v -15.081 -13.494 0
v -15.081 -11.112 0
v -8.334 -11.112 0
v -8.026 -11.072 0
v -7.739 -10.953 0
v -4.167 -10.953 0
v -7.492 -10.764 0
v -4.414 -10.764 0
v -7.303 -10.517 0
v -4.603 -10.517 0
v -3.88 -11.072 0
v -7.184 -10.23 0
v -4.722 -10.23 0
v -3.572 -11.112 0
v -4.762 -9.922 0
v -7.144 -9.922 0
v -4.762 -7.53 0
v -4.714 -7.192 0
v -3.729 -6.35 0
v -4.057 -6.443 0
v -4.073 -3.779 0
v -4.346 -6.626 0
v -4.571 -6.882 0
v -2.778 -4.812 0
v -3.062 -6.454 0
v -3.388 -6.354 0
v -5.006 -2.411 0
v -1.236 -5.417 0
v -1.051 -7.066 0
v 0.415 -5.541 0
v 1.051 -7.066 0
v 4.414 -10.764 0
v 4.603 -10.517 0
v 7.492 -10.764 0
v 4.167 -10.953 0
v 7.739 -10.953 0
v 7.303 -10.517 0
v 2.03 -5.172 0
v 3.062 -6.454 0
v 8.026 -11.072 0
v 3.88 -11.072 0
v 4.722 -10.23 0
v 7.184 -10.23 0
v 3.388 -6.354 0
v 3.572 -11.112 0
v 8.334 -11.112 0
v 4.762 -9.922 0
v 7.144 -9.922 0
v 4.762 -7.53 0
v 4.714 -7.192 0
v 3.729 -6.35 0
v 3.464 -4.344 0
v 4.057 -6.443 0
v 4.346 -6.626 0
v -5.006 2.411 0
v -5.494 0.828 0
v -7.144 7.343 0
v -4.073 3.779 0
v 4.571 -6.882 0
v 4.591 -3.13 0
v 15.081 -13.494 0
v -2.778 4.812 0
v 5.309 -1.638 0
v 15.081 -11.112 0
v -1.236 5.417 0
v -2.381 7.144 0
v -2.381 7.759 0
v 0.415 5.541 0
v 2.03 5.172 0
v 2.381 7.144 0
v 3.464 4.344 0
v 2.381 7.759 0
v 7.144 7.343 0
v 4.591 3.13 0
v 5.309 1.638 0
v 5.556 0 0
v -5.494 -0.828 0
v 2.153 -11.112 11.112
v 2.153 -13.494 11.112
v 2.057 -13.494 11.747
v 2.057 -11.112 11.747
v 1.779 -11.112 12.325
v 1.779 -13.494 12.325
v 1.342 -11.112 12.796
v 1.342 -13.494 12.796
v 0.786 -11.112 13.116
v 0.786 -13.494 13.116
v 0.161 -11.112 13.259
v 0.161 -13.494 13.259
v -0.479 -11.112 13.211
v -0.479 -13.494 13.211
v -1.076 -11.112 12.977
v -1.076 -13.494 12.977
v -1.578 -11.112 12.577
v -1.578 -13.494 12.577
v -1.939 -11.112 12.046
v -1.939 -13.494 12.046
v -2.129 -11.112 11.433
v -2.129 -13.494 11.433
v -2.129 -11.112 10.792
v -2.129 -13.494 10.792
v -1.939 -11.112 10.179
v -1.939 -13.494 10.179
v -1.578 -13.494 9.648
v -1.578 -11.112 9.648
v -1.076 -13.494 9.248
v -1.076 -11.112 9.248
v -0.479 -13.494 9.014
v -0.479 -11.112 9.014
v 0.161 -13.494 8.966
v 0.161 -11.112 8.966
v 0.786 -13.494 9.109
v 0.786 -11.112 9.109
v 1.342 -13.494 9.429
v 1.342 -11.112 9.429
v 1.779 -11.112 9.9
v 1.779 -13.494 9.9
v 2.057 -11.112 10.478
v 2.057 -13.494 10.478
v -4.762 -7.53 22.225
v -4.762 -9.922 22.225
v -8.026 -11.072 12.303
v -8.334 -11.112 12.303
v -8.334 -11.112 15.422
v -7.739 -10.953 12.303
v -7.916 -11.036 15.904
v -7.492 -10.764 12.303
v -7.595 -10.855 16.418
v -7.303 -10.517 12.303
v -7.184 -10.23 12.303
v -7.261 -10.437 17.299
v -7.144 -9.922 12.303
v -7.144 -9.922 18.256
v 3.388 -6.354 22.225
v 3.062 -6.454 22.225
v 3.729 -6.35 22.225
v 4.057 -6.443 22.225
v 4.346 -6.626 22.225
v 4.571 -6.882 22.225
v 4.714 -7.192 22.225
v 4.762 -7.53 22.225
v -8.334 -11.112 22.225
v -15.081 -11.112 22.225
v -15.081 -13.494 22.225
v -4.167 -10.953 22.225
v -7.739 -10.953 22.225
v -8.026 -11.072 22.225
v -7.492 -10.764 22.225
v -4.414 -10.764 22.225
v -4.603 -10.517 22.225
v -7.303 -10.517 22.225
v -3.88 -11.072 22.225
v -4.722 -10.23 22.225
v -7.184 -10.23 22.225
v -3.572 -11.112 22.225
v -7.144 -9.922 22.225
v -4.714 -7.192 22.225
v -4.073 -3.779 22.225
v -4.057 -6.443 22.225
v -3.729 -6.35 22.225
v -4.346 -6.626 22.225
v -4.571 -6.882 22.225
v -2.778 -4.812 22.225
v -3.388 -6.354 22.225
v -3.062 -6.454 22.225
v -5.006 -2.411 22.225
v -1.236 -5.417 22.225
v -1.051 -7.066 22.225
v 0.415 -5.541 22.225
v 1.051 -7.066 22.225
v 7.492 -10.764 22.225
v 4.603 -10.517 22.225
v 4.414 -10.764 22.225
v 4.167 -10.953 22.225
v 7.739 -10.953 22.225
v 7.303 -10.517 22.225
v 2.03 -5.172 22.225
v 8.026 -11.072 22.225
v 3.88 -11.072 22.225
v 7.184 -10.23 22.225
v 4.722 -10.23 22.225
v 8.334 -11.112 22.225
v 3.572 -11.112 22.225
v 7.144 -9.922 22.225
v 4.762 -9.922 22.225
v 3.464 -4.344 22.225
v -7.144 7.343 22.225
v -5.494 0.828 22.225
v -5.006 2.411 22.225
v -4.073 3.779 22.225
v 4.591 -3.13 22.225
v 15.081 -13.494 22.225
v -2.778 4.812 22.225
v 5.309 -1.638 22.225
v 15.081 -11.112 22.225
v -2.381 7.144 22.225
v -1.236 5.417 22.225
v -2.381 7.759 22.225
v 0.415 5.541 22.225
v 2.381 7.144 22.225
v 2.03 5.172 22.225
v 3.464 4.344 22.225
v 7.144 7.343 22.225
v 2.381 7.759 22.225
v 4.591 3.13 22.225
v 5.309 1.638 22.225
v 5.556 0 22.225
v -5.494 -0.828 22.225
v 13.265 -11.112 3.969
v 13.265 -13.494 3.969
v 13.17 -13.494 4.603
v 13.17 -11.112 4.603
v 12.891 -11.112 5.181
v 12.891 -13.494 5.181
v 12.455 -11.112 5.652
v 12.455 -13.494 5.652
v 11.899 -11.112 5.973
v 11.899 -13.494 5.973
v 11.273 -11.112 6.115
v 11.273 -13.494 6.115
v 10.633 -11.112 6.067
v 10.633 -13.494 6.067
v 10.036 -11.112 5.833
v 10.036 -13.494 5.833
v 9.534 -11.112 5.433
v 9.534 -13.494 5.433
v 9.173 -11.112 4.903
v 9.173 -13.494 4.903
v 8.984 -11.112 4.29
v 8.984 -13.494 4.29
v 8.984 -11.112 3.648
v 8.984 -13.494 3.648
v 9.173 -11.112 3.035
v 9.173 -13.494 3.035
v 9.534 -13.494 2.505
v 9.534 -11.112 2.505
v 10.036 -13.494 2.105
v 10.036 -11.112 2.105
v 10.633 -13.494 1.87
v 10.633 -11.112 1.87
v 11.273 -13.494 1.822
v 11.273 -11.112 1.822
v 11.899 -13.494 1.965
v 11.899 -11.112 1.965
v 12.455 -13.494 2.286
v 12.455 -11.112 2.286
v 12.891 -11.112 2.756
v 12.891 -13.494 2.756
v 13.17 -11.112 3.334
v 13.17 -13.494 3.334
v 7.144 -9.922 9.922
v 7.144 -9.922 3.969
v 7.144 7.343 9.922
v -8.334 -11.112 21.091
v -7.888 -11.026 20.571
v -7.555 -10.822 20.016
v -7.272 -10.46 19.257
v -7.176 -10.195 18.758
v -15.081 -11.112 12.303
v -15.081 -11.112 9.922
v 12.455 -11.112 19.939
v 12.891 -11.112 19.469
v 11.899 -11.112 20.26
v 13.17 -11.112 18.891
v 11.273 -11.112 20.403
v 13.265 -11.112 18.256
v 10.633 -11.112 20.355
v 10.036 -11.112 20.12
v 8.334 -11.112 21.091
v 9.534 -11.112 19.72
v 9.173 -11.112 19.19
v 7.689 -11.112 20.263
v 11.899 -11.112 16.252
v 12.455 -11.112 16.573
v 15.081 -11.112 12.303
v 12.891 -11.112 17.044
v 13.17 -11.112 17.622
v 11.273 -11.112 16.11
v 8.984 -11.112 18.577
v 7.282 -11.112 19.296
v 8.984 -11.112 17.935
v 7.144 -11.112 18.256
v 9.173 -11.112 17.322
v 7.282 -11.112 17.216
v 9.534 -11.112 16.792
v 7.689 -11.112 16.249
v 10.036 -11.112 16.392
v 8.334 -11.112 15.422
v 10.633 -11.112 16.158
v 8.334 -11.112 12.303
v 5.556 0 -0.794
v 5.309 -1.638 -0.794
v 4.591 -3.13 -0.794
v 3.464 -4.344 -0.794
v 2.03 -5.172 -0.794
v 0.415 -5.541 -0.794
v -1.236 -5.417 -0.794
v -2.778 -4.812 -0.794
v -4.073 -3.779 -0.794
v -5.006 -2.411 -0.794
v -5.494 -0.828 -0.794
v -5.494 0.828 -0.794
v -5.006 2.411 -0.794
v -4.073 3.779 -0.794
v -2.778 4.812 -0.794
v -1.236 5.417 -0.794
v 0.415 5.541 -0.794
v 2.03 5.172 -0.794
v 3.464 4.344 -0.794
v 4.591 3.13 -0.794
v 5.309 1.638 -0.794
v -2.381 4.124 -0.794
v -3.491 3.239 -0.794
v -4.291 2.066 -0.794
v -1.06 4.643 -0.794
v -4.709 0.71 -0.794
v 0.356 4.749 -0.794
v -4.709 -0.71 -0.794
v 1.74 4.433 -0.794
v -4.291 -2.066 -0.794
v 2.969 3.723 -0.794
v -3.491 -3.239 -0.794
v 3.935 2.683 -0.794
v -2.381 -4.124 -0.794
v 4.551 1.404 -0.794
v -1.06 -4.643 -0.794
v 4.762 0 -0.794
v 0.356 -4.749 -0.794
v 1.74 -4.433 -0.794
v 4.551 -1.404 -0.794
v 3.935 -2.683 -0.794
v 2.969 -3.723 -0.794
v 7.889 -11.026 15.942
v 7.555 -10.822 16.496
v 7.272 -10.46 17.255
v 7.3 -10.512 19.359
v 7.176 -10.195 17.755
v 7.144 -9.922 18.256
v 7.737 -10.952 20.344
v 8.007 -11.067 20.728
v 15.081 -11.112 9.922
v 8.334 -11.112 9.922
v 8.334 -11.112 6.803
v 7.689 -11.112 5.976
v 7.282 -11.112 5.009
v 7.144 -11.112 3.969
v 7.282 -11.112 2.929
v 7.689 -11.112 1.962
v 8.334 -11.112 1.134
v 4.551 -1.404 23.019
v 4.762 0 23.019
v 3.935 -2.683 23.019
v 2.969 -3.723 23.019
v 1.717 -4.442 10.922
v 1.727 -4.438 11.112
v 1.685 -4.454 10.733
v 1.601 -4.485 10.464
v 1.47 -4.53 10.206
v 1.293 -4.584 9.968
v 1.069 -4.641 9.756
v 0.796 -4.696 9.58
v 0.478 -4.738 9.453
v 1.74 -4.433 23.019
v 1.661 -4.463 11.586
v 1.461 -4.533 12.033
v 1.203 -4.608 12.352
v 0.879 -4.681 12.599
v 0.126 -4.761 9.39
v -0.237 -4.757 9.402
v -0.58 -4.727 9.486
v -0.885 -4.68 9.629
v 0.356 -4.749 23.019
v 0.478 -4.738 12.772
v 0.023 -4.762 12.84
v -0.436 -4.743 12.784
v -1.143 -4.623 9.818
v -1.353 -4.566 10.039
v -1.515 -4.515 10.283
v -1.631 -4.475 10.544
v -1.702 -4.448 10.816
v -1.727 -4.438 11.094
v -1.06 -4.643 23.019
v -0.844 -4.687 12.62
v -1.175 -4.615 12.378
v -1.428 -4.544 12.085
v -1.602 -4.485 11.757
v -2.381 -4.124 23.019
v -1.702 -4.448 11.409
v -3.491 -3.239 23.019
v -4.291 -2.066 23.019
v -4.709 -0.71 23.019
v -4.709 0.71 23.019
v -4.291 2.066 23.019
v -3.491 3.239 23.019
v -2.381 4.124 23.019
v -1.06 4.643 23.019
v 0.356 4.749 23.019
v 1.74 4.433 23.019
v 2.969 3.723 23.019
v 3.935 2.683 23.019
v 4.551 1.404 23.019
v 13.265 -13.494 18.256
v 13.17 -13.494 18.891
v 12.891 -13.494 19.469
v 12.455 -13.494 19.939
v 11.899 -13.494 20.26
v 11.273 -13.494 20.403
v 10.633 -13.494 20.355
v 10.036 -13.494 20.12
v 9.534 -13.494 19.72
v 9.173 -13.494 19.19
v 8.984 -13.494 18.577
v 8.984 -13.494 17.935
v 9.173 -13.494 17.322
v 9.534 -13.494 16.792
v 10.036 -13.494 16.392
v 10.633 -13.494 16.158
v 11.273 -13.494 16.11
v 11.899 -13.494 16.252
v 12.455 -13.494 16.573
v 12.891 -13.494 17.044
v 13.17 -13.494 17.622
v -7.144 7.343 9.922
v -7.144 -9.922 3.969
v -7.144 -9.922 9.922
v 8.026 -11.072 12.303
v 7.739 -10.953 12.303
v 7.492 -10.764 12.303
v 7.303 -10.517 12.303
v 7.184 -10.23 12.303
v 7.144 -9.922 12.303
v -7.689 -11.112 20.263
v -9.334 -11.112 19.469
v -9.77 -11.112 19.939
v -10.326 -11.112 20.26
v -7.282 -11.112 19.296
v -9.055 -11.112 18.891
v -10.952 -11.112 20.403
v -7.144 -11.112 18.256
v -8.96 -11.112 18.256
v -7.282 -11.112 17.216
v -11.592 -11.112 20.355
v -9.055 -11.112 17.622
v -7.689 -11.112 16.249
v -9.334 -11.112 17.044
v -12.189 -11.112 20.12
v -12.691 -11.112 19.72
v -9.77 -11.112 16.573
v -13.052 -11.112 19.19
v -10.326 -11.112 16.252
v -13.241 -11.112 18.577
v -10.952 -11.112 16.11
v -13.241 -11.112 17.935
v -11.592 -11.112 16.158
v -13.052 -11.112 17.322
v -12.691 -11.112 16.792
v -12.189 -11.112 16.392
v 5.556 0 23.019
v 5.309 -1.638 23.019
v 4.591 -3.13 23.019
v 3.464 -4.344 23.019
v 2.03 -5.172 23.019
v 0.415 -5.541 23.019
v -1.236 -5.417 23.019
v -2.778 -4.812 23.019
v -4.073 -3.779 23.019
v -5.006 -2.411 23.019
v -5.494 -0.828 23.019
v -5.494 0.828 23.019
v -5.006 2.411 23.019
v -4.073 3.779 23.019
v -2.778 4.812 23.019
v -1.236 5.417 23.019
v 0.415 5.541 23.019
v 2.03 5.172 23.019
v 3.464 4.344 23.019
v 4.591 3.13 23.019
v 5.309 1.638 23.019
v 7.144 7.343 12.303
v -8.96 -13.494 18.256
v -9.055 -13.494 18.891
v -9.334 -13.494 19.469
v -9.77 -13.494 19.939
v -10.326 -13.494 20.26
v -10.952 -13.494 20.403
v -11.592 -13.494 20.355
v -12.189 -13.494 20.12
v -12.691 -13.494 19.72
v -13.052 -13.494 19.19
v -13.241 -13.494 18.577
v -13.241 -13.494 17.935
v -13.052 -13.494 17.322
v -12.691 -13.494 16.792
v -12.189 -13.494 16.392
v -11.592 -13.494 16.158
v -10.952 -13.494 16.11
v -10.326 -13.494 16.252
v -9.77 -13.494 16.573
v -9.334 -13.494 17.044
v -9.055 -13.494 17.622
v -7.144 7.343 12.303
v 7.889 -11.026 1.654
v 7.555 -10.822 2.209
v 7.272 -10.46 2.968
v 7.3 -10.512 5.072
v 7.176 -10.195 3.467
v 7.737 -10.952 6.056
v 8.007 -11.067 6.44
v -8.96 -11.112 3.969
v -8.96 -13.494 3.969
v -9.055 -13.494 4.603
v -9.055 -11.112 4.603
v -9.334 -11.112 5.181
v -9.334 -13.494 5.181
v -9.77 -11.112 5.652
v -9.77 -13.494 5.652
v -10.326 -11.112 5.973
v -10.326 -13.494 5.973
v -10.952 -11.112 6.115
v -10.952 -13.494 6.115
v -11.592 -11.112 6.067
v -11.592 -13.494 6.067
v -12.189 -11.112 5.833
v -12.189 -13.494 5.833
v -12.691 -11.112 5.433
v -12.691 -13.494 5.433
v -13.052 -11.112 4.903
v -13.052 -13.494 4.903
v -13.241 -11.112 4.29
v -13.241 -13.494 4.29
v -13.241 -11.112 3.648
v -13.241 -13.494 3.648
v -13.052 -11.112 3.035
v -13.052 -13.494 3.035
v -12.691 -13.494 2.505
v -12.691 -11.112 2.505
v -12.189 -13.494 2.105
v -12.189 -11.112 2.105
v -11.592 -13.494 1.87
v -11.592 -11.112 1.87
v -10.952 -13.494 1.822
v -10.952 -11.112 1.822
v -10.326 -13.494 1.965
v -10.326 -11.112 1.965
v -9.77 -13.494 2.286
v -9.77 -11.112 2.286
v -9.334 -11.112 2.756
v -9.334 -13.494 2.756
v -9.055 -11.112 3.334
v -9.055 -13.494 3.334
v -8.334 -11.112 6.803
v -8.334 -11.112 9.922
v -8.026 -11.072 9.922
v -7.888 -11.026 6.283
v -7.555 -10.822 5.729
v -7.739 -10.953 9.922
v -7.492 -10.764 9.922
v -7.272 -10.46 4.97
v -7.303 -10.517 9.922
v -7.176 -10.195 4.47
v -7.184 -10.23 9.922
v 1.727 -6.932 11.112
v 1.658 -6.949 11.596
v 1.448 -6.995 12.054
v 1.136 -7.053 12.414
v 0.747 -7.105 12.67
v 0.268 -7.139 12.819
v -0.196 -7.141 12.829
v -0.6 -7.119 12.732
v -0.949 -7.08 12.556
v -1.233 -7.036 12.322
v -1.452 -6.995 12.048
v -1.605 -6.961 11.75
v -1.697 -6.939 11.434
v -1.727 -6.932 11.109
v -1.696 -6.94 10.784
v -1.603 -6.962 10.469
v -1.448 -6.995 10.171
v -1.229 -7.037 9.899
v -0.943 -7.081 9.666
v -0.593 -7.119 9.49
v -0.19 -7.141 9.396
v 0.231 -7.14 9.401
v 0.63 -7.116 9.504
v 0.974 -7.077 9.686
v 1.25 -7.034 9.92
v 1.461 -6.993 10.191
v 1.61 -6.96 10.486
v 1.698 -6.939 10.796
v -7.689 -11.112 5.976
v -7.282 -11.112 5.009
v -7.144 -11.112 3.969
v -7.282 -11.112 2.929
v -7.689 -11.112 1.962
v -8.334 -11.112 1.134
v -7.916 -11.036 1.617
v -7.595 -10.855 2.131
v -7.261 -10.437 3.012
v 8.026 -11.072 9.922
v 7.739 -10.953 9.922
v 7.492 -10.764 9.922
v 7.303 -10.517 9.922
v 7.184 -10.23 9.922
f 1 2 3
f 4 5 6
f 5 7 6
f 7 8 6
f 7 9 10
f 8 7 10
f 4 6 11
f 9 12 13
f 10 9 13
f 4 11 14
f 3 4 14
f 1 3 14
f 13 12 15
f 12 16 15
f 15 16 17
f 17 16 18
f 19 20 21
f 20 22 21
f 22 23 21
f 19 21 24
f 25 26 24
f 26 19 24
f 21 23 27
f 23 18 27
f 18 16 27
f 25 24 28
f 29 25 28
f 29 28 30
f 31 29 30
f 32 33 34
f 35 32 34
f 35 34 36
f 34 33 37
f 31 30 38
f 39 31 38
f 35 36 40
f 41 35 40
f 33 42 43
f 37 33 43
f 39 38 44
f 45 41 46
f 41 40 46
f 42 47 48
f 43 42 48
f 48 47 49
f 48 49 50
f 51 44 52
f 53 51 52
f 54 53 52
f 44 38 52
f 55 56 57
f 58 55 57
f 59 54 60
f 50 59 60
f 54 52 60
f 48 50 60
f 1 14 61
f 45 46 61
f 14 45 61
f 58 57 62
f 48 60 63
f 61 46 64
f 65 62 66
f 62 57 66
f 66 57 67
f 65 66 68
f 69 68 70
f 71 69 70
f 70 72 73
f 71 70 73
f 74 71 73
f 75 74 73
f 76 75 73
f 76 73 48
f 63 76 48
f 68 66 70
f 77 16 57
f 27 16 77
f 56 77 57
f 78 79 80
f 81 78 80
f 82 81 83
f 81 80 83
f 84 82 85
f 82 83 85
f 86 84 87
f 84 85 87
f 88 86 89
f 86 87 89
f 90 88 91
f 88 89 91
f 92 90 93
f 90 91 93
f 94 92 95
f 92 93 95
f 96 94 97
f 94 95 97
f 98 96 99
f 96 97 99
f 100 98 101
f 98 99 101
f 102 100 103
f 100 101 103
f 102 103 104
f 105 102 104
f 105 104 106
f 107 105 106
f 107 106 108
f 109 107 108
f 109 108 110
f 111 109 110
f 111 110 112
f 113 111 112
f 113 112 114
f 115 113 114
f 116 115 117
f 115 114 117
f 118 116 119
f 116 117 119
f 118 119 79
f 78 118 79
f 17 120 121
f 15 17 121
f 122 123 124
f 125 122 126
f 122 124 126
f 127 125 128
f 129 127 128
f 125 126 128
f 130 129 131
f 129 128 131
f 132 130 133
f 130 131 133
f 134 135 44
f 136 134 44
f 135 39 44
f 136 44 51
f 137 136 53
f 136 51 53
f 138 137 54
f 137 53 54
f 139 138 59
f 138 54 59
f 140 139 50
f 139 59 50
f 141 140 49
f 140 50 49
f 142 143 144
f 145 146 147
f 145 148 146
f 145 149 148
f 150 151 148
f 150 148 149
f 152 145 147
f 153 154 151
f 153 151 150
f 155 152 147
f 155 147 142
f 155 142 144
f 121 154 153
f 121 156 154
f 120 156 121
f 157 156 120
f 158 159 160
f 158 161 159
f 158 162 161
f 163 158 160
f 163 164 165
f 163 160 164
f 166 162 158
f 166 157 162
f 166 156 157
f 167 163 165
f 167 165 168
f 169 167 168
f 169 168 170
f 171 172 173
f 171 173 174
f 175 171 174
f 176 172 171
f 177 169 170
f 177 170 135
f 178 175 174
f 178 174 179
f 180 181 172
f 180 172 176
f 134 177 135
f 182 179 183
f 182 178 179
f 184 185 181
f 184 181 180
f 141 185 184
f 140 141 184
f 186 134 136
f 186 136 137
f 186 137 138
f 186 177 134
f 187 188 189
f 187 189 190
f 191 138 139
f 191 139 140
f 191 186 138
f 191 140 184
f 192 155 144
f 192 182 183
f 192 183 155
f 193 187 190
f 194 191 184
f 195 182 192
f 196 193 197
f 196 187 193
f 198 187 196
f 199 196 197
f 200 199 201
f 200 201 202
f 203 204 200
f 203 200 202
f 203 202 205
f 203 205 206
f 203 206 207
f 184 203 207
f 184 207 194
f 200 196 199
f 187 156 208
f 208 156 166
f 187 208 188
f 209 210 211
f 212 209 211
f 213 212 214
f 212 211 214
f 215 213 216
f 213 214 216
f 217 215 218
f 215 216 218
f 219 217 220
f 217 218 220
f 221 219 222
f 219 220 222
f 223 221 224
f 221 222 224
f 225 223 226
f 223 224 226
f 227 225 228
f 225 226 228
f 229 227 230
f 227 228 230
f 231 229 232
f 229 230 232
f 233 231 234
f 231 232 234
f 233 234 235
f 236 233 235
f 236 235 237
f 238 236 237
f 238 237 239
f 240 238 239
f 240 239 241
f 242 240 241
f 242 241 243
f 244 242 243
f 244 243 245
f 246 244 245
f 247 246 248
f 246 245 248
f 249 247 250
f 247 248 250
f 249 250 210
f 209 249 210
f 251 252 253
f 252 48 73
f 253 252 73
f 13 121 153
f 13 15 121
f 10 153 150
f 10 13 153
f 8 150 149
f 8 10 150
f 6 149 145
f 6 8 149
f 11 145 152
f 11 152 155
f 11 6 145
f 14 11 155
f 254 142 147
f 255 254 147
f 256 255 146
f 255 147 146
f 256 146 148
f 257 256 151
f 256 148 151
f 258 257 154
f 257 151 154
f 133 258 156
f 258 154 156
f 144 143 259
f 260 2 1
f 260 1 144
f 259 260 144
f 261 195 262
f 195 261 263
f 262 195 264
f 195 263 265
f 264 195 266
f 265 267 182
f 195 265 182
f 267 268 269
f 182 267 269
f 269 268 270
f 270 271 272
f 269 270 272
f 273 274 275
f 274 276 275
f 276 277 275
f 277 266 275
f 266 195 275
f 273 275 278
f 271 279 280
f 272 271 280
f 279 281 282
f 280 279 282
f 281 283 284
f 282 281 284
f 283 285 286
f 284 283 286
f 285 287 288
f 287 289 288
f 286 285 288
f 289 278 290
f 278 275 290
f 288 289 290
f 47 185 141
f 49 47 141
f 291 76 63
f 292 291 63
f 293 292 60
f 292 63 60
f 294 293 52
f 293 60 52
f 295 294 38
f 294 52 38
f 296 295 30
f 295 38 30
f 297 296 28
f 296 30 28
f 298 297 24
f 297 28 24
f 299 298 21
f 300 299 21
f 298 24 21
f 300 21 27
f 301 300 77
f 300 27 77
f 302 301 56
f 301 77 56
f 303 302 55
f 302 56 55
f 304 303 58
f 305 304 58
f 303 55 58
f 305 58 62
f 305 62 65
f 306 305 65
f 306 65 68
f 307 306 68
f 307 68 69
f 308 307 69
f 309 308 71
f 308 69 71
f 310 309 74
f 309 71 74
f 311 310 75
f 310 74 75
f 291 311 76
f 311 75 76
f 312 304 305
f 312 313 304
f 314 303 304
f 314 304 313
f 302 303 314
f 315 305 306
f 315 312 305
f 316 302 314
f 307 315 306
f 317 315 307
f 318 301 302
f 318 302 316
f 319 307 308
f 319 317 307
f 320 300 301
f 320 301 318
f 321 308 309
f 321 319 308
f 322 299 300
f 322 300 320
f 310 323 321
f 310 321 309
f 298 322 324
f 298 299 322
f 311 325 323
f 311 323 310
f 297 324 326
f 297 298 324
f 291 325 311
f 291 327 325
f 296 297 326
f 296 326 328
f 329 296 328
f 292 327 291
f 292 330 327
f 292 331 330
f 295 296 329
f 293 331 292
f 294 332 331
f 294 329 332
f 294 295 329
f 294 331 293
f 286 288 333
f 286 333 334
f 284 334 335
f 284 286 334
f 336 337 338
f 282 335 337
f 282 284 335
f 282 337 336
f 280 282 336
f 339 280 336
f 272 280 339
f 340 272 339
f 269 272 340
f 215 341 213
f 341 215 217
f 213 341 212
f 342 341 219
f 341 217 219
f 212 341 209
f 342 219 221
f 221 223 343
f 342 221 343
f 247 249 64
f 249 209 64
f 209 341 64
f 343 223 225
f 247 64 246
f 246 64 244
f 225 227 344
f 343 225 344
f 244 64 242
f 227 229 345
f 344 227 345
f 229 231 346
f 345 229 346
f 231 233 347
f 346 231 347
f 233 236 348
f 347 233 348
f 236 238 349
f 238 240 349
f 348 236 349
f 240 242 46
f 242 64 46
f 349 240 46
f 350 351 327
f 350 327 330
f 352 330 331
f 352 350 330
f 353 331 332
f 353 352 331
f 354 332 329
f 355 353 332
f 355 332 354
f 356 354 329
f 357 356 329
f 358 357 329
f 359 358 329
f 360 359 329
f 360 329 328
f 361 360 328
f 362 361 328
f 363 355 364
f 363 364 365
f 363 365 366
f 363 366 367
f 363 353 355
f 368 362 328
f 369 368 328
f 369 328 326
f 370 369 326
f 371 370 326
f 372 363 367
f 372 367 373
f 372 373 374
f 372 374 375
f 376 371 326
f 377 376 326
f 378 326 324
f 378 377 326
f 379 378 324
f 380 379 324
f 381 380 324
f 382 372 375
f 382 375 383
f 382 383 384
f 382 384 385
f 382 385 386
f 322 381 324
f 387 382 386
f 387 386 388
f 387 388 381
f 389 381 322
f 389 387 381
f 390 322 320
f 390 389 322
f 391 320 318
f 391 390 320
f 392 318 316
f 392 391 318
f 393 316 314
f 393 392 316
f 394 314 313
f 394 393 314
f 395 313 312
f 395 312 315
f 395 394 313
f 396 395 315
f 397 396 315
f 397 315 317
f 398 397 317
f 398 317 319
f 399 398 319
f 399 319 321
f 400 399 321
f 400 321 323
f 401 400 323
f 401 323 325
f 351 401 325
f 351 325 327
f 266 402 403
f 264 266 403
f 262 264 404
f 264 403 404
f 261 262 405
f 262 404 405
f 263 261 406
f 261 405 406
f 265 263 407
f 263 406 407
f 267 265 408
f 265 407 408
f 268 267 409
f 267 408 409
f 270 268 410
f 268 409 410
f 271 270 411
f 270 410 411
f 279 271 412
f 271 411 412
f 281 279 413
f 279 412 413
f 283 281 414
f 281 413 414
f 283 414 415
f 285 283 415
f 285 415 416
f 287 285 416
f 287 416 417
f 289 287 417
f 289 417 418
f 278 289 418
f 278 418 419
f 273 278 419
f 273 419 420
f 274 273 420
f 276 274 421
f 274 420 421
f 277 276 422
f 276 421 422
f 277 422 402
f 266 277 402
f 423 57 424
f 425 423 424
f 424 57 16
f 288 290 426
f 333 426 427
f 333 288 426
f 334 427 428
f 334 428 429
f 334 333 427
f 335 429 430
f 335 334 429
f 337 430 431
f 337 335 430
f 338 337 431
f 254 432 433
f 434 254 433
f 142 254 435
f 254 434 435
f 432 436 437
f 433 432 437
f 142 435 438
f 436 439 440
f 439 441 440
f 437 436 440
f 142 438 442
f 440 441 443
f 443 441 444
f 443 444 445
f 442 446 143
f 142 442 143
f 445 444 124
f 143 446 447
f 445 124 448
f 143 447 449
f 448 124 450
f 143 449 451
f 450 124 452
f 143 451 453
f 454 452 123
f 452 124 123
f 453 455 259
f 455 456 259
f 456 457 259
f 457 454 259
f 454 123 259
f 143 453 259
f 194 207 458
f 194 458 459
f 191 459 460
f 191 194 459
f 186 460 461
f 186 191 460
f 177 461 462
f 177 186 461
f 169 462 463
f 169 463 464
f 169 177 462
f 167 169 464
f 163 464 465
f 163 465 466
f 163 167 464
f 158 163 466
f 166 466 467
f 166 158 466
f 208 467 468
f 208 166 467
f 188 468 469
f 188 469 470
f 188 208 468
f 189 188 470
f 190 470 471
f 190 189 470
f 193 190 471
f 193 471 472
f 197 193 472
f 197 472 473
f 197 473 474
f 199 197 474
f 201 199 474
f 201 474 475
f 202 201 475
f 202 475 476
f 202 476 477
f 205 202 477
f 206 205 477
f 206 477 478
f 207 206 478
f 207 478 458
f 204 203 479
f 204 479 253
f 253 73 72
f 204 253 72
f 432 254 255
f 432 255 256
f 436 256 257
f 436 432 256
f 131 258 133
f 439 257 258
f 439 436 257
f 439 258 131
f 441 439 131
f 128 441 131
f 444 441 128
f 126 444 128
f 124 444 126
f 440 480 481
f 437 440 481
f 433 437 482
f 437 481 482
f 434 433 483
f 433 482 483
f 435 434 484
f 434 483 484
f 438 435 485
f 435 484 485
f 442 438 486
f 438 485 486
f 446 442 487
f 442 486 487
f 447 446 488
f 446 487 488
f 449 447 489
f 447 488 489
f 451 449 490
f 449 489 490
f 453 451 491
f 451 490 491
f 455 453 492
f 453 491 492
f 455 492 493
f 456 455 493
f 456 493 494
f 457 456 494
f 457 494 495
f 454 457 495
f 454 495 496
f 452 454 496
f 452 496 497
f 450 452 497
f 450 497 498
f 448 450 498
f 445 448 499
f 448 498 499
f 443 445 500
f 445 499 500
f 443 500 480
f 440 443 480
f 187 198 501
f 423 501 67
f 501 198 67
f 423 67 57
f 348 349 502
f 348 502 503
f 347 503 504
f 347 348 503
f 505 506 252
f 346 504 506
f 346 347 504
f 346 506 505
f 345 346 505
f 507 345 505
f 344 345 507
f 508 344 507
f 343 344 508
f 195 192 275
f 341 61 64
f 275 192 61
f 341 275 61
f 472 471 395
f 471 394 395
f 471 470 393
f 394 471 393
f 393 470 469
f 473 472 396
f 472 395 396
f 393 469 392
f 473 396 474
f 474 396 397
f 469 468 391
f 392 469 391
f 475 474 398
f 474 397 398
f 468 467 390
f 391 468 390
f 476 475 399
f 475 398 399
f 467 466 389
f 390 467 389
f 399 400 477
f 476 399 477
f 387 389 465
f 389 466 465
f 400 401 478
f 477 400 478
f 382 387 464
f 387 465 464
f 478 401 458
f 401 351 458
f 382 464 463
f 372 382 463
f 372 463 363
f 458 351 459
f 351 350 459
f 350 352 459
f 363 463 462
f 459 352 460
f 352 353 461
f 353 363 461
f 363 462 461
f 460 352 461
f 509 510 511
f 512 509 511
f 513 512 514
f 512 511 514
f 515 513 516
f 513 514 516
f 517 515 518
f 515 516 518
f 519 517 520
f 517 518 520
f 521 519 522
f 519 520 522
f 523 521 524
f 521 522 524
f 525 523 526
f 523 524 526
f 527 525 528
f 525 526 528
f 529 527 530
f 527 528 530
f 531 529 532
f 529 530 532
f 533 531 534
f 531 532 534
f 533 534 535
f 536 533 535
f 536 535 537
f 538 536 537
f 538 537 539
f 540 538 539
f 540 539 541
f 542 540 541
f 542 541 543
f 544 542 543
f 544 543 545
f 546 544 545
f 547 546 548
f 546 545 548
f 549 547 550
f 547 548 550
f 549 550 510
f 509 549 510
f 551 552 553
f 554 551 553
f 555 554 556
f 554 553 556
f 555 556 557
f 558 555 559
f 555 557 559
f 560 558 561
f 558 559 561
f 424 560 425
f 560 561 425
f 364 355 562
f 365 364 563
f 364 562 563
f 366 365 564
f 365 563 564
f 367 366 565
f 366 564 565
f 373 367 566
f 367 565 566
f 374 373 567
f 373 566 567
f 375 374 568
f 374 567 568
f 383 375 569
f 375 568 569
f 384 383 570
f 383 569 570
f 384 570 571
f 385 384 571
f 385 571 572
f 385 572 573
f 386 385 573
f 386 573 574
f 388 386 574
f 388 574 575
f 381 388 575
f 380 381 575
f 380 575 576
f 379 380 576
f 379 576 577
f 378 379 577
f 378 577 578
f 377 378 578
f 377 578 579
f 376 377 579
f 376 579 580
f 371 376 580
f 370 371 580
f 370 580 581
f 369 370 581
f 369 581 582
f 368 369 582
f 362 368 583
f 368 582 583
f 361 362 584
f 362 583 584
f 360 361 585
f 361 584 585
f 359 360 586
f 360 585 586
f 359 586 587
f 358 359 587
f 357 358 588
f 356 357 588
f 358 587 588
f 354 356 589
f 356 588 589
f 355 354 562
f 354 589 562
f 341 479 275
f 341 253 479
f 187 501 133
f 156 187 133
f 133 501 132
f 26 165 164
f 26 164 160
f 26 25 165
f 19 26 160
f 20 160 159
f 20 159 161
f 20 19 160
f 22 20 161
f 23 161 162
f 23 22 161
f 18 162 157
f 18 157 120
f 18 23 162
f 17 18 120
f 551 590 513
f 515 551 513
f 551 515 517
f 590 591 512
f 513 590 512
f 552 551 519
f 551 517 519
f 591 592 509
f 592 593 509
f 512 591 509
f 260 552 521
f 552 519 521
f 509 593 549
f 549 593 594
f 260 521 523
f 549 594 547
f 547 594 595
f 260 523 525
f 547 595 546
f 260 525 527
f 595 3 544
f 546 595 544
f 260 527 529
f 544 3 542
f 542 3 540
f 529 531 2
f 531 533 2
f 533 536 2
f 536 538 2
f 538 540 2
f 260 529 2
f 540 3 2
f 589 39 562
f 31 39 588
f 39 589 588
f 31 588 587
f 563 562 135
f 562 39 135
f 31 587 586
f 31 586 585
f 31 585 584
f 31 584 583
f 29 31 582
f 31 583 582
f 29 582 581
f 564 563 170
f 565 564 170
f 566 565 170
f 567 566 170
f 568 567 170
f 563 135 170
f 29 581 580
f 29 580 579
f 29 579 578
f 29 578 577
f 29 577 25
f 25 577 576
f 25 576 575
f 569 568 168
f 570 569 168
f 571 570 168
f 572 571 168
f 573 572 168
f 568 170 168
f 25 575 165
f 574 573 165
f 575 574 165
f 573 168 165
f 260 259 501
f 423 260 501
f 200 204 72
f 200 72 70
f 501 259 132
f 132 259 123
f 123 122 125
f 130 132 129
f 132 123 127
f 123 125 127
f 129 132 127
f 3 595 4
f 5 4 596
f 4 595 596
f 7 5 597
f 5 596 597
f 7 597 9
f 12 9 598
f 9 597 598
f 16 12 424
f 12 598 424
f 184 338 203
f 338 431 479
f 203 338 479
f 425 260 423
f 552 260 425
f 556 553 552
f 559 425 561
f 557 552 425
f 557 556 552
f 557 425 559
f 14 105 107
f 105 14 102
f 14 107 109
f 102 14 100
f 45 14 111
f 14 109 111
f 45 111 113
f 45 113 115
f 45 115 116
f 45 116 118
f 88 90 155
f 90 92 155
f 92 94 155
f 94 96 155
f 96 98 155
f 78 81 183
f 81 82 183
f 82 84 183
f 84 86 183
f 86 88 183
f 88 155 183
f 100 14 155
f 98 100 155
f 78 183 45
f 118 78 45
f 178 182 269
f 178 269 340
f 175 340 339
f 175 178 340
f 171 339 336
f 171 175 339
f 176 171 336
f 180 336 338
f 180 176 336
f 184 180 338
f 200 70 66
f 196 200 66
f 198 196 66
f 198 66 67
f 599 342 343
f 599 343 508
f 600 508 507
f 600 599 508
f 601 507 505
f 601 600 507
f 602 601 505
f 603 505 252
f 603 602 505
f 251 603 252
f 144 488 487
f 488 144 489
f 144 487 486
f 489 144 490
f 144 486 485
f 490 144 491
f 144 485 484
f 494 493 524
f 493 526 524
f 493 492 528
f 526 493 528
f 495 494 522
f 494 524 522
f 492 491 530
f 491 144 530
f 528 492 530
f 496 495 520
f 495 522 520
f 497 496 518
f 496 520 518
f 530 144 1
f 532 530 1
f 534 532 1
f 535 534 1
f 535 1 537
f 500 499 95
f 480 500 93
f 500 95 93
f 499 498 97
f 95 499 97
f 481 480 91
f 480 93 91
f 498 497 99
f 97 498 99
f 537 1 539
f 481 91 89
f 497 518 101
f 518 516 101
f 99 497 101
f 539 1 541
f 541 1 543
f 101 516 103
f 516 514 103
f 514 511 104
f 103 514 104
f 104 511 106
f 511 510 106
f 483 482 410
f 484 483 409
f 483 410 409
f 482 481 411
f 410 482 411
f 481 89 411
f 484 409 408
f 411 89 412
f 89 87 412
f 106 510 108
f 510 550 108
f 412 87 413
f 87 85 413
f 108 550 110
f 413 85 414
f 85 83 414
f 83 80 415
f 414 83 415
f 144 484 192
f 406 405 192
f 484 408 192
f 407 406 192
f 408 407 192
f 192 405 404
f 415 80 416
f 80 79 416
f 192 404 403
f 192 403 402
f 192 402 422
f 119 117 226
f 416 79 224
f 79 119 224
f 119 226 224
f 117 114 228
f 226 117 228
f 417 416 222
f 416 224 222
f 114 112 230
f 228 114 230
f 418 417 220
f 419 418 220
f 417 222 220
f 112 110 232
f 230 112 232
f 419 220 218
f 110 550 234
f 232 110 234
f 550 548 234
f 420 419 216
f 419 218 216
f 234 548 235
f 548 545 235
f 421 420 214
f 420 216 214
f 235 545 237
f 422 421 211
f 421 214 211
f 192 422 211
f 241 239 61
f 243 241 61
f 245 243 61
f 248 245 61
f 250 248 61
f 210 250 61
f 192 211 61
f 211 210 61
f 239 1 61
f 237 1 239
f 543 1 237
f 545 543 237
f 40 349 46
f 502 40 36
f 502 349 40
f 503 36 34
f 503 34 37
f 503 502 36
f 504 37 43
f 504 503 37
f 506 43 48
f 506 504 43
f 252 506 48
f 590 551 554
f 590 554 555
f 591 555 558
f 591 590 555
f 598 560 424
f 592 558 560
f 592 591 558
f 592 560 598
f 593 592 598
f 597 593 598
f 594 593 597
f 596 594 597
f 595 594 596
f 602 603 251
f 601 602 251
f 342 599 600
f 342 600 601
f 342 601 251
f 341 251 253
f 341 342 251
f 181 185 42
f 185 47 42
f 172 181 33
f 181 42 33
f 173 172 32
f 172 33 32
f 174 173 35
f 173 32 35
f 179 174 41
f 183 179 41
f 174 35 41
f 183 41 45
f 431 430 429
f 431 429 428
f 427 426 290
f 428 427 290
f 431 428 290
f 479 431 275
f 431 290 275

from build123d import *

# Parameters (mm, degrees)
F0_R          = 4.7625
F1_DEPTH      = 22.225
F4_DEPTH      = 1.190625
F5_R          = 5.55625
F5_R_2        = 4.7625
F7_DEPTH      = 0.79375
F7_DEPTH_BACK = 23.01875
F8_R          = 1.7272
F9_DEPTH      = 10.0554862042
F11_DEPTH     = 22.225
F12_R         = 2.15265
F13_DEPTH     = 2.38125
F14_R         = 1.190625
F15_R         = 2.15265
F16_DEPTH     = 2.38125
F17_R         = 3.96875
F18_DEPTH     = 18.8729875805


with BuildPart() as f1:
    # F0 (on Top) → F1 (new body)
    with BuildSketch(Plane.XY):
        Polygon((-15.08125, -13.49375), (15.08125, -13.49375), (15.08125, -11.1125), (7.14375, -11.1125), (7.14375, 7.3428228204), (2.38125, 7.7594875805), (2.38125, 7.14375), (-2.38125, 7.14375), (-2.38125, 7.7594875805), (-7.14375, 7.3428228204), (-7.14375, -11.1125), (-15.08125, -11.1125), align=None)
        Circle(F0_R, mode=Mode.SUBTRACT)
    extrude(amount=F1_DEPTH)

    # F3 (on offset) → F4 (join, symmetric)
    with BuildSketch(Plane(origin=(0, 0, 11.1125), x_dir=(1, 0, 0), z_dir=(0, 0, -1))):
        Polygon((-15.08125, 11.1125), (-7.14375, -7.3428228204), (-7.14375, 11.1125), align=None)
        Polygon((15.08125, 11.1125), (7.14375, 11.1125), (7.14375, -7.3428228204), align=None)
    extrude(amount=F4_DEPTH, both=True)

    # F5 (on face) → F7 (join, two sides)
    with BuildSketch(Plane(origin=(0, 0, 0), x_dir=(1, 0, 0), z_dir=(0, 0, -1))) as f7_sk:
        Circle(F5_R)
        Circle(F5_R_2, mode=Mode.SUBTRACT)
    extrude(amount=F7_DEPTH)
    extrude(f7_sk.sketch, amount=-F7_DEPTH_BACK)

    # F8 (on face) → F9 (cut, up to face)
    with BuildSketch(Plane.XZ.offset(13.49375)):
        with Locations((0, 11.1125)):
            Circle(F8_R)
    extrude(amount=-F9_DEPTH, mode=Mode.SUBTRACT)

    # F10 (on face) → F11 (cut, through all)
    with BuildSketch(Plane.XY.offset(22.225)):
        with BuildLine():
            Line((-4.7625, -5.3246368714), (-4.7625, -11.1125))
            Line((-4.7625, -11.1125), (4.7625, -11.1125))
            Line((4.7625, -11.1125), (4.7625, -5.3246368714))
            ThreePointArc((4.7625, -5.3246368714), (0, -7.14375), (-4.7625, -5.3246368714))
        make_face()
    extrude(amount=-F11_DEPTH, mode=Mode.SUBTRACT)

    # F12 (on face) → F13 (cut, through all)
    with BuildSketch(Plane.XZ.offset(13.49375)):
        with Locations((0, 11.1125)):
            Circle(F12_R)
    extrude(amount=-F13_DEPTH, mode=Mode.SUBTRACT)

    # F14
    f14_edges = [f1.edges().sort_by_distance(p)[0] for p in [
        (7.14375, -11.1125, 4.960938),
        (7.14375, -11.1125, 17.264063),
        (-7.14375, -11.1125, 4.960938),
        (-7.14375, -11.1125, 17.264063),
        (-4.7625, -11.1125, 11.1125),
        (4.7625, -11.1125, 11.1125),
        (4.7625, -5.324637, 11.1125),
        (-4.7625, -5.324637, 11.1125),
    ]]
    fillet(f14_edges, radius=F14_R)

    # F15 (on face) → F16 (cut, through all)
    with BuildSketch(Plane.XZ.offset(13.49375)):
        with Locations((11.1125, 18.25625)):
            Circle(F15_R)
        with Locations((-11.1125, 18.25625)):
            Circle(F15_R)
        with Locations((-11.1125, 3.96875)):
            Circle(F15_R)
        with Locations((11.1125, 3.96875)):
            Circle(F15_R)
    extrude(amount=-F16_DEPTH, mode=Mode.SUBTRACT)

    # F17 (on face) → F18 (cut, through all)
    with BuildSketch(Plane(origin=(0, -11.1125, 0), x_dir=(-1, 0, 0), z_dir=(0, 1, 0))):
        with Locations((11.1125000001, 18.25625)):
            Circle(F17_R)
        with Locations((11.1125000001, 3.96875)):
            Circle(F17_R)
        with Locations((-11.1124999999, 3.96875)):
            Circle(F17_R)
        with Locations((-11.1124999999, 18.25625)):
            Circle(F17_R)
    extrude(amount=F18_DEPTH, mode=Mode.SUBTRACT)


solid = f1.part
